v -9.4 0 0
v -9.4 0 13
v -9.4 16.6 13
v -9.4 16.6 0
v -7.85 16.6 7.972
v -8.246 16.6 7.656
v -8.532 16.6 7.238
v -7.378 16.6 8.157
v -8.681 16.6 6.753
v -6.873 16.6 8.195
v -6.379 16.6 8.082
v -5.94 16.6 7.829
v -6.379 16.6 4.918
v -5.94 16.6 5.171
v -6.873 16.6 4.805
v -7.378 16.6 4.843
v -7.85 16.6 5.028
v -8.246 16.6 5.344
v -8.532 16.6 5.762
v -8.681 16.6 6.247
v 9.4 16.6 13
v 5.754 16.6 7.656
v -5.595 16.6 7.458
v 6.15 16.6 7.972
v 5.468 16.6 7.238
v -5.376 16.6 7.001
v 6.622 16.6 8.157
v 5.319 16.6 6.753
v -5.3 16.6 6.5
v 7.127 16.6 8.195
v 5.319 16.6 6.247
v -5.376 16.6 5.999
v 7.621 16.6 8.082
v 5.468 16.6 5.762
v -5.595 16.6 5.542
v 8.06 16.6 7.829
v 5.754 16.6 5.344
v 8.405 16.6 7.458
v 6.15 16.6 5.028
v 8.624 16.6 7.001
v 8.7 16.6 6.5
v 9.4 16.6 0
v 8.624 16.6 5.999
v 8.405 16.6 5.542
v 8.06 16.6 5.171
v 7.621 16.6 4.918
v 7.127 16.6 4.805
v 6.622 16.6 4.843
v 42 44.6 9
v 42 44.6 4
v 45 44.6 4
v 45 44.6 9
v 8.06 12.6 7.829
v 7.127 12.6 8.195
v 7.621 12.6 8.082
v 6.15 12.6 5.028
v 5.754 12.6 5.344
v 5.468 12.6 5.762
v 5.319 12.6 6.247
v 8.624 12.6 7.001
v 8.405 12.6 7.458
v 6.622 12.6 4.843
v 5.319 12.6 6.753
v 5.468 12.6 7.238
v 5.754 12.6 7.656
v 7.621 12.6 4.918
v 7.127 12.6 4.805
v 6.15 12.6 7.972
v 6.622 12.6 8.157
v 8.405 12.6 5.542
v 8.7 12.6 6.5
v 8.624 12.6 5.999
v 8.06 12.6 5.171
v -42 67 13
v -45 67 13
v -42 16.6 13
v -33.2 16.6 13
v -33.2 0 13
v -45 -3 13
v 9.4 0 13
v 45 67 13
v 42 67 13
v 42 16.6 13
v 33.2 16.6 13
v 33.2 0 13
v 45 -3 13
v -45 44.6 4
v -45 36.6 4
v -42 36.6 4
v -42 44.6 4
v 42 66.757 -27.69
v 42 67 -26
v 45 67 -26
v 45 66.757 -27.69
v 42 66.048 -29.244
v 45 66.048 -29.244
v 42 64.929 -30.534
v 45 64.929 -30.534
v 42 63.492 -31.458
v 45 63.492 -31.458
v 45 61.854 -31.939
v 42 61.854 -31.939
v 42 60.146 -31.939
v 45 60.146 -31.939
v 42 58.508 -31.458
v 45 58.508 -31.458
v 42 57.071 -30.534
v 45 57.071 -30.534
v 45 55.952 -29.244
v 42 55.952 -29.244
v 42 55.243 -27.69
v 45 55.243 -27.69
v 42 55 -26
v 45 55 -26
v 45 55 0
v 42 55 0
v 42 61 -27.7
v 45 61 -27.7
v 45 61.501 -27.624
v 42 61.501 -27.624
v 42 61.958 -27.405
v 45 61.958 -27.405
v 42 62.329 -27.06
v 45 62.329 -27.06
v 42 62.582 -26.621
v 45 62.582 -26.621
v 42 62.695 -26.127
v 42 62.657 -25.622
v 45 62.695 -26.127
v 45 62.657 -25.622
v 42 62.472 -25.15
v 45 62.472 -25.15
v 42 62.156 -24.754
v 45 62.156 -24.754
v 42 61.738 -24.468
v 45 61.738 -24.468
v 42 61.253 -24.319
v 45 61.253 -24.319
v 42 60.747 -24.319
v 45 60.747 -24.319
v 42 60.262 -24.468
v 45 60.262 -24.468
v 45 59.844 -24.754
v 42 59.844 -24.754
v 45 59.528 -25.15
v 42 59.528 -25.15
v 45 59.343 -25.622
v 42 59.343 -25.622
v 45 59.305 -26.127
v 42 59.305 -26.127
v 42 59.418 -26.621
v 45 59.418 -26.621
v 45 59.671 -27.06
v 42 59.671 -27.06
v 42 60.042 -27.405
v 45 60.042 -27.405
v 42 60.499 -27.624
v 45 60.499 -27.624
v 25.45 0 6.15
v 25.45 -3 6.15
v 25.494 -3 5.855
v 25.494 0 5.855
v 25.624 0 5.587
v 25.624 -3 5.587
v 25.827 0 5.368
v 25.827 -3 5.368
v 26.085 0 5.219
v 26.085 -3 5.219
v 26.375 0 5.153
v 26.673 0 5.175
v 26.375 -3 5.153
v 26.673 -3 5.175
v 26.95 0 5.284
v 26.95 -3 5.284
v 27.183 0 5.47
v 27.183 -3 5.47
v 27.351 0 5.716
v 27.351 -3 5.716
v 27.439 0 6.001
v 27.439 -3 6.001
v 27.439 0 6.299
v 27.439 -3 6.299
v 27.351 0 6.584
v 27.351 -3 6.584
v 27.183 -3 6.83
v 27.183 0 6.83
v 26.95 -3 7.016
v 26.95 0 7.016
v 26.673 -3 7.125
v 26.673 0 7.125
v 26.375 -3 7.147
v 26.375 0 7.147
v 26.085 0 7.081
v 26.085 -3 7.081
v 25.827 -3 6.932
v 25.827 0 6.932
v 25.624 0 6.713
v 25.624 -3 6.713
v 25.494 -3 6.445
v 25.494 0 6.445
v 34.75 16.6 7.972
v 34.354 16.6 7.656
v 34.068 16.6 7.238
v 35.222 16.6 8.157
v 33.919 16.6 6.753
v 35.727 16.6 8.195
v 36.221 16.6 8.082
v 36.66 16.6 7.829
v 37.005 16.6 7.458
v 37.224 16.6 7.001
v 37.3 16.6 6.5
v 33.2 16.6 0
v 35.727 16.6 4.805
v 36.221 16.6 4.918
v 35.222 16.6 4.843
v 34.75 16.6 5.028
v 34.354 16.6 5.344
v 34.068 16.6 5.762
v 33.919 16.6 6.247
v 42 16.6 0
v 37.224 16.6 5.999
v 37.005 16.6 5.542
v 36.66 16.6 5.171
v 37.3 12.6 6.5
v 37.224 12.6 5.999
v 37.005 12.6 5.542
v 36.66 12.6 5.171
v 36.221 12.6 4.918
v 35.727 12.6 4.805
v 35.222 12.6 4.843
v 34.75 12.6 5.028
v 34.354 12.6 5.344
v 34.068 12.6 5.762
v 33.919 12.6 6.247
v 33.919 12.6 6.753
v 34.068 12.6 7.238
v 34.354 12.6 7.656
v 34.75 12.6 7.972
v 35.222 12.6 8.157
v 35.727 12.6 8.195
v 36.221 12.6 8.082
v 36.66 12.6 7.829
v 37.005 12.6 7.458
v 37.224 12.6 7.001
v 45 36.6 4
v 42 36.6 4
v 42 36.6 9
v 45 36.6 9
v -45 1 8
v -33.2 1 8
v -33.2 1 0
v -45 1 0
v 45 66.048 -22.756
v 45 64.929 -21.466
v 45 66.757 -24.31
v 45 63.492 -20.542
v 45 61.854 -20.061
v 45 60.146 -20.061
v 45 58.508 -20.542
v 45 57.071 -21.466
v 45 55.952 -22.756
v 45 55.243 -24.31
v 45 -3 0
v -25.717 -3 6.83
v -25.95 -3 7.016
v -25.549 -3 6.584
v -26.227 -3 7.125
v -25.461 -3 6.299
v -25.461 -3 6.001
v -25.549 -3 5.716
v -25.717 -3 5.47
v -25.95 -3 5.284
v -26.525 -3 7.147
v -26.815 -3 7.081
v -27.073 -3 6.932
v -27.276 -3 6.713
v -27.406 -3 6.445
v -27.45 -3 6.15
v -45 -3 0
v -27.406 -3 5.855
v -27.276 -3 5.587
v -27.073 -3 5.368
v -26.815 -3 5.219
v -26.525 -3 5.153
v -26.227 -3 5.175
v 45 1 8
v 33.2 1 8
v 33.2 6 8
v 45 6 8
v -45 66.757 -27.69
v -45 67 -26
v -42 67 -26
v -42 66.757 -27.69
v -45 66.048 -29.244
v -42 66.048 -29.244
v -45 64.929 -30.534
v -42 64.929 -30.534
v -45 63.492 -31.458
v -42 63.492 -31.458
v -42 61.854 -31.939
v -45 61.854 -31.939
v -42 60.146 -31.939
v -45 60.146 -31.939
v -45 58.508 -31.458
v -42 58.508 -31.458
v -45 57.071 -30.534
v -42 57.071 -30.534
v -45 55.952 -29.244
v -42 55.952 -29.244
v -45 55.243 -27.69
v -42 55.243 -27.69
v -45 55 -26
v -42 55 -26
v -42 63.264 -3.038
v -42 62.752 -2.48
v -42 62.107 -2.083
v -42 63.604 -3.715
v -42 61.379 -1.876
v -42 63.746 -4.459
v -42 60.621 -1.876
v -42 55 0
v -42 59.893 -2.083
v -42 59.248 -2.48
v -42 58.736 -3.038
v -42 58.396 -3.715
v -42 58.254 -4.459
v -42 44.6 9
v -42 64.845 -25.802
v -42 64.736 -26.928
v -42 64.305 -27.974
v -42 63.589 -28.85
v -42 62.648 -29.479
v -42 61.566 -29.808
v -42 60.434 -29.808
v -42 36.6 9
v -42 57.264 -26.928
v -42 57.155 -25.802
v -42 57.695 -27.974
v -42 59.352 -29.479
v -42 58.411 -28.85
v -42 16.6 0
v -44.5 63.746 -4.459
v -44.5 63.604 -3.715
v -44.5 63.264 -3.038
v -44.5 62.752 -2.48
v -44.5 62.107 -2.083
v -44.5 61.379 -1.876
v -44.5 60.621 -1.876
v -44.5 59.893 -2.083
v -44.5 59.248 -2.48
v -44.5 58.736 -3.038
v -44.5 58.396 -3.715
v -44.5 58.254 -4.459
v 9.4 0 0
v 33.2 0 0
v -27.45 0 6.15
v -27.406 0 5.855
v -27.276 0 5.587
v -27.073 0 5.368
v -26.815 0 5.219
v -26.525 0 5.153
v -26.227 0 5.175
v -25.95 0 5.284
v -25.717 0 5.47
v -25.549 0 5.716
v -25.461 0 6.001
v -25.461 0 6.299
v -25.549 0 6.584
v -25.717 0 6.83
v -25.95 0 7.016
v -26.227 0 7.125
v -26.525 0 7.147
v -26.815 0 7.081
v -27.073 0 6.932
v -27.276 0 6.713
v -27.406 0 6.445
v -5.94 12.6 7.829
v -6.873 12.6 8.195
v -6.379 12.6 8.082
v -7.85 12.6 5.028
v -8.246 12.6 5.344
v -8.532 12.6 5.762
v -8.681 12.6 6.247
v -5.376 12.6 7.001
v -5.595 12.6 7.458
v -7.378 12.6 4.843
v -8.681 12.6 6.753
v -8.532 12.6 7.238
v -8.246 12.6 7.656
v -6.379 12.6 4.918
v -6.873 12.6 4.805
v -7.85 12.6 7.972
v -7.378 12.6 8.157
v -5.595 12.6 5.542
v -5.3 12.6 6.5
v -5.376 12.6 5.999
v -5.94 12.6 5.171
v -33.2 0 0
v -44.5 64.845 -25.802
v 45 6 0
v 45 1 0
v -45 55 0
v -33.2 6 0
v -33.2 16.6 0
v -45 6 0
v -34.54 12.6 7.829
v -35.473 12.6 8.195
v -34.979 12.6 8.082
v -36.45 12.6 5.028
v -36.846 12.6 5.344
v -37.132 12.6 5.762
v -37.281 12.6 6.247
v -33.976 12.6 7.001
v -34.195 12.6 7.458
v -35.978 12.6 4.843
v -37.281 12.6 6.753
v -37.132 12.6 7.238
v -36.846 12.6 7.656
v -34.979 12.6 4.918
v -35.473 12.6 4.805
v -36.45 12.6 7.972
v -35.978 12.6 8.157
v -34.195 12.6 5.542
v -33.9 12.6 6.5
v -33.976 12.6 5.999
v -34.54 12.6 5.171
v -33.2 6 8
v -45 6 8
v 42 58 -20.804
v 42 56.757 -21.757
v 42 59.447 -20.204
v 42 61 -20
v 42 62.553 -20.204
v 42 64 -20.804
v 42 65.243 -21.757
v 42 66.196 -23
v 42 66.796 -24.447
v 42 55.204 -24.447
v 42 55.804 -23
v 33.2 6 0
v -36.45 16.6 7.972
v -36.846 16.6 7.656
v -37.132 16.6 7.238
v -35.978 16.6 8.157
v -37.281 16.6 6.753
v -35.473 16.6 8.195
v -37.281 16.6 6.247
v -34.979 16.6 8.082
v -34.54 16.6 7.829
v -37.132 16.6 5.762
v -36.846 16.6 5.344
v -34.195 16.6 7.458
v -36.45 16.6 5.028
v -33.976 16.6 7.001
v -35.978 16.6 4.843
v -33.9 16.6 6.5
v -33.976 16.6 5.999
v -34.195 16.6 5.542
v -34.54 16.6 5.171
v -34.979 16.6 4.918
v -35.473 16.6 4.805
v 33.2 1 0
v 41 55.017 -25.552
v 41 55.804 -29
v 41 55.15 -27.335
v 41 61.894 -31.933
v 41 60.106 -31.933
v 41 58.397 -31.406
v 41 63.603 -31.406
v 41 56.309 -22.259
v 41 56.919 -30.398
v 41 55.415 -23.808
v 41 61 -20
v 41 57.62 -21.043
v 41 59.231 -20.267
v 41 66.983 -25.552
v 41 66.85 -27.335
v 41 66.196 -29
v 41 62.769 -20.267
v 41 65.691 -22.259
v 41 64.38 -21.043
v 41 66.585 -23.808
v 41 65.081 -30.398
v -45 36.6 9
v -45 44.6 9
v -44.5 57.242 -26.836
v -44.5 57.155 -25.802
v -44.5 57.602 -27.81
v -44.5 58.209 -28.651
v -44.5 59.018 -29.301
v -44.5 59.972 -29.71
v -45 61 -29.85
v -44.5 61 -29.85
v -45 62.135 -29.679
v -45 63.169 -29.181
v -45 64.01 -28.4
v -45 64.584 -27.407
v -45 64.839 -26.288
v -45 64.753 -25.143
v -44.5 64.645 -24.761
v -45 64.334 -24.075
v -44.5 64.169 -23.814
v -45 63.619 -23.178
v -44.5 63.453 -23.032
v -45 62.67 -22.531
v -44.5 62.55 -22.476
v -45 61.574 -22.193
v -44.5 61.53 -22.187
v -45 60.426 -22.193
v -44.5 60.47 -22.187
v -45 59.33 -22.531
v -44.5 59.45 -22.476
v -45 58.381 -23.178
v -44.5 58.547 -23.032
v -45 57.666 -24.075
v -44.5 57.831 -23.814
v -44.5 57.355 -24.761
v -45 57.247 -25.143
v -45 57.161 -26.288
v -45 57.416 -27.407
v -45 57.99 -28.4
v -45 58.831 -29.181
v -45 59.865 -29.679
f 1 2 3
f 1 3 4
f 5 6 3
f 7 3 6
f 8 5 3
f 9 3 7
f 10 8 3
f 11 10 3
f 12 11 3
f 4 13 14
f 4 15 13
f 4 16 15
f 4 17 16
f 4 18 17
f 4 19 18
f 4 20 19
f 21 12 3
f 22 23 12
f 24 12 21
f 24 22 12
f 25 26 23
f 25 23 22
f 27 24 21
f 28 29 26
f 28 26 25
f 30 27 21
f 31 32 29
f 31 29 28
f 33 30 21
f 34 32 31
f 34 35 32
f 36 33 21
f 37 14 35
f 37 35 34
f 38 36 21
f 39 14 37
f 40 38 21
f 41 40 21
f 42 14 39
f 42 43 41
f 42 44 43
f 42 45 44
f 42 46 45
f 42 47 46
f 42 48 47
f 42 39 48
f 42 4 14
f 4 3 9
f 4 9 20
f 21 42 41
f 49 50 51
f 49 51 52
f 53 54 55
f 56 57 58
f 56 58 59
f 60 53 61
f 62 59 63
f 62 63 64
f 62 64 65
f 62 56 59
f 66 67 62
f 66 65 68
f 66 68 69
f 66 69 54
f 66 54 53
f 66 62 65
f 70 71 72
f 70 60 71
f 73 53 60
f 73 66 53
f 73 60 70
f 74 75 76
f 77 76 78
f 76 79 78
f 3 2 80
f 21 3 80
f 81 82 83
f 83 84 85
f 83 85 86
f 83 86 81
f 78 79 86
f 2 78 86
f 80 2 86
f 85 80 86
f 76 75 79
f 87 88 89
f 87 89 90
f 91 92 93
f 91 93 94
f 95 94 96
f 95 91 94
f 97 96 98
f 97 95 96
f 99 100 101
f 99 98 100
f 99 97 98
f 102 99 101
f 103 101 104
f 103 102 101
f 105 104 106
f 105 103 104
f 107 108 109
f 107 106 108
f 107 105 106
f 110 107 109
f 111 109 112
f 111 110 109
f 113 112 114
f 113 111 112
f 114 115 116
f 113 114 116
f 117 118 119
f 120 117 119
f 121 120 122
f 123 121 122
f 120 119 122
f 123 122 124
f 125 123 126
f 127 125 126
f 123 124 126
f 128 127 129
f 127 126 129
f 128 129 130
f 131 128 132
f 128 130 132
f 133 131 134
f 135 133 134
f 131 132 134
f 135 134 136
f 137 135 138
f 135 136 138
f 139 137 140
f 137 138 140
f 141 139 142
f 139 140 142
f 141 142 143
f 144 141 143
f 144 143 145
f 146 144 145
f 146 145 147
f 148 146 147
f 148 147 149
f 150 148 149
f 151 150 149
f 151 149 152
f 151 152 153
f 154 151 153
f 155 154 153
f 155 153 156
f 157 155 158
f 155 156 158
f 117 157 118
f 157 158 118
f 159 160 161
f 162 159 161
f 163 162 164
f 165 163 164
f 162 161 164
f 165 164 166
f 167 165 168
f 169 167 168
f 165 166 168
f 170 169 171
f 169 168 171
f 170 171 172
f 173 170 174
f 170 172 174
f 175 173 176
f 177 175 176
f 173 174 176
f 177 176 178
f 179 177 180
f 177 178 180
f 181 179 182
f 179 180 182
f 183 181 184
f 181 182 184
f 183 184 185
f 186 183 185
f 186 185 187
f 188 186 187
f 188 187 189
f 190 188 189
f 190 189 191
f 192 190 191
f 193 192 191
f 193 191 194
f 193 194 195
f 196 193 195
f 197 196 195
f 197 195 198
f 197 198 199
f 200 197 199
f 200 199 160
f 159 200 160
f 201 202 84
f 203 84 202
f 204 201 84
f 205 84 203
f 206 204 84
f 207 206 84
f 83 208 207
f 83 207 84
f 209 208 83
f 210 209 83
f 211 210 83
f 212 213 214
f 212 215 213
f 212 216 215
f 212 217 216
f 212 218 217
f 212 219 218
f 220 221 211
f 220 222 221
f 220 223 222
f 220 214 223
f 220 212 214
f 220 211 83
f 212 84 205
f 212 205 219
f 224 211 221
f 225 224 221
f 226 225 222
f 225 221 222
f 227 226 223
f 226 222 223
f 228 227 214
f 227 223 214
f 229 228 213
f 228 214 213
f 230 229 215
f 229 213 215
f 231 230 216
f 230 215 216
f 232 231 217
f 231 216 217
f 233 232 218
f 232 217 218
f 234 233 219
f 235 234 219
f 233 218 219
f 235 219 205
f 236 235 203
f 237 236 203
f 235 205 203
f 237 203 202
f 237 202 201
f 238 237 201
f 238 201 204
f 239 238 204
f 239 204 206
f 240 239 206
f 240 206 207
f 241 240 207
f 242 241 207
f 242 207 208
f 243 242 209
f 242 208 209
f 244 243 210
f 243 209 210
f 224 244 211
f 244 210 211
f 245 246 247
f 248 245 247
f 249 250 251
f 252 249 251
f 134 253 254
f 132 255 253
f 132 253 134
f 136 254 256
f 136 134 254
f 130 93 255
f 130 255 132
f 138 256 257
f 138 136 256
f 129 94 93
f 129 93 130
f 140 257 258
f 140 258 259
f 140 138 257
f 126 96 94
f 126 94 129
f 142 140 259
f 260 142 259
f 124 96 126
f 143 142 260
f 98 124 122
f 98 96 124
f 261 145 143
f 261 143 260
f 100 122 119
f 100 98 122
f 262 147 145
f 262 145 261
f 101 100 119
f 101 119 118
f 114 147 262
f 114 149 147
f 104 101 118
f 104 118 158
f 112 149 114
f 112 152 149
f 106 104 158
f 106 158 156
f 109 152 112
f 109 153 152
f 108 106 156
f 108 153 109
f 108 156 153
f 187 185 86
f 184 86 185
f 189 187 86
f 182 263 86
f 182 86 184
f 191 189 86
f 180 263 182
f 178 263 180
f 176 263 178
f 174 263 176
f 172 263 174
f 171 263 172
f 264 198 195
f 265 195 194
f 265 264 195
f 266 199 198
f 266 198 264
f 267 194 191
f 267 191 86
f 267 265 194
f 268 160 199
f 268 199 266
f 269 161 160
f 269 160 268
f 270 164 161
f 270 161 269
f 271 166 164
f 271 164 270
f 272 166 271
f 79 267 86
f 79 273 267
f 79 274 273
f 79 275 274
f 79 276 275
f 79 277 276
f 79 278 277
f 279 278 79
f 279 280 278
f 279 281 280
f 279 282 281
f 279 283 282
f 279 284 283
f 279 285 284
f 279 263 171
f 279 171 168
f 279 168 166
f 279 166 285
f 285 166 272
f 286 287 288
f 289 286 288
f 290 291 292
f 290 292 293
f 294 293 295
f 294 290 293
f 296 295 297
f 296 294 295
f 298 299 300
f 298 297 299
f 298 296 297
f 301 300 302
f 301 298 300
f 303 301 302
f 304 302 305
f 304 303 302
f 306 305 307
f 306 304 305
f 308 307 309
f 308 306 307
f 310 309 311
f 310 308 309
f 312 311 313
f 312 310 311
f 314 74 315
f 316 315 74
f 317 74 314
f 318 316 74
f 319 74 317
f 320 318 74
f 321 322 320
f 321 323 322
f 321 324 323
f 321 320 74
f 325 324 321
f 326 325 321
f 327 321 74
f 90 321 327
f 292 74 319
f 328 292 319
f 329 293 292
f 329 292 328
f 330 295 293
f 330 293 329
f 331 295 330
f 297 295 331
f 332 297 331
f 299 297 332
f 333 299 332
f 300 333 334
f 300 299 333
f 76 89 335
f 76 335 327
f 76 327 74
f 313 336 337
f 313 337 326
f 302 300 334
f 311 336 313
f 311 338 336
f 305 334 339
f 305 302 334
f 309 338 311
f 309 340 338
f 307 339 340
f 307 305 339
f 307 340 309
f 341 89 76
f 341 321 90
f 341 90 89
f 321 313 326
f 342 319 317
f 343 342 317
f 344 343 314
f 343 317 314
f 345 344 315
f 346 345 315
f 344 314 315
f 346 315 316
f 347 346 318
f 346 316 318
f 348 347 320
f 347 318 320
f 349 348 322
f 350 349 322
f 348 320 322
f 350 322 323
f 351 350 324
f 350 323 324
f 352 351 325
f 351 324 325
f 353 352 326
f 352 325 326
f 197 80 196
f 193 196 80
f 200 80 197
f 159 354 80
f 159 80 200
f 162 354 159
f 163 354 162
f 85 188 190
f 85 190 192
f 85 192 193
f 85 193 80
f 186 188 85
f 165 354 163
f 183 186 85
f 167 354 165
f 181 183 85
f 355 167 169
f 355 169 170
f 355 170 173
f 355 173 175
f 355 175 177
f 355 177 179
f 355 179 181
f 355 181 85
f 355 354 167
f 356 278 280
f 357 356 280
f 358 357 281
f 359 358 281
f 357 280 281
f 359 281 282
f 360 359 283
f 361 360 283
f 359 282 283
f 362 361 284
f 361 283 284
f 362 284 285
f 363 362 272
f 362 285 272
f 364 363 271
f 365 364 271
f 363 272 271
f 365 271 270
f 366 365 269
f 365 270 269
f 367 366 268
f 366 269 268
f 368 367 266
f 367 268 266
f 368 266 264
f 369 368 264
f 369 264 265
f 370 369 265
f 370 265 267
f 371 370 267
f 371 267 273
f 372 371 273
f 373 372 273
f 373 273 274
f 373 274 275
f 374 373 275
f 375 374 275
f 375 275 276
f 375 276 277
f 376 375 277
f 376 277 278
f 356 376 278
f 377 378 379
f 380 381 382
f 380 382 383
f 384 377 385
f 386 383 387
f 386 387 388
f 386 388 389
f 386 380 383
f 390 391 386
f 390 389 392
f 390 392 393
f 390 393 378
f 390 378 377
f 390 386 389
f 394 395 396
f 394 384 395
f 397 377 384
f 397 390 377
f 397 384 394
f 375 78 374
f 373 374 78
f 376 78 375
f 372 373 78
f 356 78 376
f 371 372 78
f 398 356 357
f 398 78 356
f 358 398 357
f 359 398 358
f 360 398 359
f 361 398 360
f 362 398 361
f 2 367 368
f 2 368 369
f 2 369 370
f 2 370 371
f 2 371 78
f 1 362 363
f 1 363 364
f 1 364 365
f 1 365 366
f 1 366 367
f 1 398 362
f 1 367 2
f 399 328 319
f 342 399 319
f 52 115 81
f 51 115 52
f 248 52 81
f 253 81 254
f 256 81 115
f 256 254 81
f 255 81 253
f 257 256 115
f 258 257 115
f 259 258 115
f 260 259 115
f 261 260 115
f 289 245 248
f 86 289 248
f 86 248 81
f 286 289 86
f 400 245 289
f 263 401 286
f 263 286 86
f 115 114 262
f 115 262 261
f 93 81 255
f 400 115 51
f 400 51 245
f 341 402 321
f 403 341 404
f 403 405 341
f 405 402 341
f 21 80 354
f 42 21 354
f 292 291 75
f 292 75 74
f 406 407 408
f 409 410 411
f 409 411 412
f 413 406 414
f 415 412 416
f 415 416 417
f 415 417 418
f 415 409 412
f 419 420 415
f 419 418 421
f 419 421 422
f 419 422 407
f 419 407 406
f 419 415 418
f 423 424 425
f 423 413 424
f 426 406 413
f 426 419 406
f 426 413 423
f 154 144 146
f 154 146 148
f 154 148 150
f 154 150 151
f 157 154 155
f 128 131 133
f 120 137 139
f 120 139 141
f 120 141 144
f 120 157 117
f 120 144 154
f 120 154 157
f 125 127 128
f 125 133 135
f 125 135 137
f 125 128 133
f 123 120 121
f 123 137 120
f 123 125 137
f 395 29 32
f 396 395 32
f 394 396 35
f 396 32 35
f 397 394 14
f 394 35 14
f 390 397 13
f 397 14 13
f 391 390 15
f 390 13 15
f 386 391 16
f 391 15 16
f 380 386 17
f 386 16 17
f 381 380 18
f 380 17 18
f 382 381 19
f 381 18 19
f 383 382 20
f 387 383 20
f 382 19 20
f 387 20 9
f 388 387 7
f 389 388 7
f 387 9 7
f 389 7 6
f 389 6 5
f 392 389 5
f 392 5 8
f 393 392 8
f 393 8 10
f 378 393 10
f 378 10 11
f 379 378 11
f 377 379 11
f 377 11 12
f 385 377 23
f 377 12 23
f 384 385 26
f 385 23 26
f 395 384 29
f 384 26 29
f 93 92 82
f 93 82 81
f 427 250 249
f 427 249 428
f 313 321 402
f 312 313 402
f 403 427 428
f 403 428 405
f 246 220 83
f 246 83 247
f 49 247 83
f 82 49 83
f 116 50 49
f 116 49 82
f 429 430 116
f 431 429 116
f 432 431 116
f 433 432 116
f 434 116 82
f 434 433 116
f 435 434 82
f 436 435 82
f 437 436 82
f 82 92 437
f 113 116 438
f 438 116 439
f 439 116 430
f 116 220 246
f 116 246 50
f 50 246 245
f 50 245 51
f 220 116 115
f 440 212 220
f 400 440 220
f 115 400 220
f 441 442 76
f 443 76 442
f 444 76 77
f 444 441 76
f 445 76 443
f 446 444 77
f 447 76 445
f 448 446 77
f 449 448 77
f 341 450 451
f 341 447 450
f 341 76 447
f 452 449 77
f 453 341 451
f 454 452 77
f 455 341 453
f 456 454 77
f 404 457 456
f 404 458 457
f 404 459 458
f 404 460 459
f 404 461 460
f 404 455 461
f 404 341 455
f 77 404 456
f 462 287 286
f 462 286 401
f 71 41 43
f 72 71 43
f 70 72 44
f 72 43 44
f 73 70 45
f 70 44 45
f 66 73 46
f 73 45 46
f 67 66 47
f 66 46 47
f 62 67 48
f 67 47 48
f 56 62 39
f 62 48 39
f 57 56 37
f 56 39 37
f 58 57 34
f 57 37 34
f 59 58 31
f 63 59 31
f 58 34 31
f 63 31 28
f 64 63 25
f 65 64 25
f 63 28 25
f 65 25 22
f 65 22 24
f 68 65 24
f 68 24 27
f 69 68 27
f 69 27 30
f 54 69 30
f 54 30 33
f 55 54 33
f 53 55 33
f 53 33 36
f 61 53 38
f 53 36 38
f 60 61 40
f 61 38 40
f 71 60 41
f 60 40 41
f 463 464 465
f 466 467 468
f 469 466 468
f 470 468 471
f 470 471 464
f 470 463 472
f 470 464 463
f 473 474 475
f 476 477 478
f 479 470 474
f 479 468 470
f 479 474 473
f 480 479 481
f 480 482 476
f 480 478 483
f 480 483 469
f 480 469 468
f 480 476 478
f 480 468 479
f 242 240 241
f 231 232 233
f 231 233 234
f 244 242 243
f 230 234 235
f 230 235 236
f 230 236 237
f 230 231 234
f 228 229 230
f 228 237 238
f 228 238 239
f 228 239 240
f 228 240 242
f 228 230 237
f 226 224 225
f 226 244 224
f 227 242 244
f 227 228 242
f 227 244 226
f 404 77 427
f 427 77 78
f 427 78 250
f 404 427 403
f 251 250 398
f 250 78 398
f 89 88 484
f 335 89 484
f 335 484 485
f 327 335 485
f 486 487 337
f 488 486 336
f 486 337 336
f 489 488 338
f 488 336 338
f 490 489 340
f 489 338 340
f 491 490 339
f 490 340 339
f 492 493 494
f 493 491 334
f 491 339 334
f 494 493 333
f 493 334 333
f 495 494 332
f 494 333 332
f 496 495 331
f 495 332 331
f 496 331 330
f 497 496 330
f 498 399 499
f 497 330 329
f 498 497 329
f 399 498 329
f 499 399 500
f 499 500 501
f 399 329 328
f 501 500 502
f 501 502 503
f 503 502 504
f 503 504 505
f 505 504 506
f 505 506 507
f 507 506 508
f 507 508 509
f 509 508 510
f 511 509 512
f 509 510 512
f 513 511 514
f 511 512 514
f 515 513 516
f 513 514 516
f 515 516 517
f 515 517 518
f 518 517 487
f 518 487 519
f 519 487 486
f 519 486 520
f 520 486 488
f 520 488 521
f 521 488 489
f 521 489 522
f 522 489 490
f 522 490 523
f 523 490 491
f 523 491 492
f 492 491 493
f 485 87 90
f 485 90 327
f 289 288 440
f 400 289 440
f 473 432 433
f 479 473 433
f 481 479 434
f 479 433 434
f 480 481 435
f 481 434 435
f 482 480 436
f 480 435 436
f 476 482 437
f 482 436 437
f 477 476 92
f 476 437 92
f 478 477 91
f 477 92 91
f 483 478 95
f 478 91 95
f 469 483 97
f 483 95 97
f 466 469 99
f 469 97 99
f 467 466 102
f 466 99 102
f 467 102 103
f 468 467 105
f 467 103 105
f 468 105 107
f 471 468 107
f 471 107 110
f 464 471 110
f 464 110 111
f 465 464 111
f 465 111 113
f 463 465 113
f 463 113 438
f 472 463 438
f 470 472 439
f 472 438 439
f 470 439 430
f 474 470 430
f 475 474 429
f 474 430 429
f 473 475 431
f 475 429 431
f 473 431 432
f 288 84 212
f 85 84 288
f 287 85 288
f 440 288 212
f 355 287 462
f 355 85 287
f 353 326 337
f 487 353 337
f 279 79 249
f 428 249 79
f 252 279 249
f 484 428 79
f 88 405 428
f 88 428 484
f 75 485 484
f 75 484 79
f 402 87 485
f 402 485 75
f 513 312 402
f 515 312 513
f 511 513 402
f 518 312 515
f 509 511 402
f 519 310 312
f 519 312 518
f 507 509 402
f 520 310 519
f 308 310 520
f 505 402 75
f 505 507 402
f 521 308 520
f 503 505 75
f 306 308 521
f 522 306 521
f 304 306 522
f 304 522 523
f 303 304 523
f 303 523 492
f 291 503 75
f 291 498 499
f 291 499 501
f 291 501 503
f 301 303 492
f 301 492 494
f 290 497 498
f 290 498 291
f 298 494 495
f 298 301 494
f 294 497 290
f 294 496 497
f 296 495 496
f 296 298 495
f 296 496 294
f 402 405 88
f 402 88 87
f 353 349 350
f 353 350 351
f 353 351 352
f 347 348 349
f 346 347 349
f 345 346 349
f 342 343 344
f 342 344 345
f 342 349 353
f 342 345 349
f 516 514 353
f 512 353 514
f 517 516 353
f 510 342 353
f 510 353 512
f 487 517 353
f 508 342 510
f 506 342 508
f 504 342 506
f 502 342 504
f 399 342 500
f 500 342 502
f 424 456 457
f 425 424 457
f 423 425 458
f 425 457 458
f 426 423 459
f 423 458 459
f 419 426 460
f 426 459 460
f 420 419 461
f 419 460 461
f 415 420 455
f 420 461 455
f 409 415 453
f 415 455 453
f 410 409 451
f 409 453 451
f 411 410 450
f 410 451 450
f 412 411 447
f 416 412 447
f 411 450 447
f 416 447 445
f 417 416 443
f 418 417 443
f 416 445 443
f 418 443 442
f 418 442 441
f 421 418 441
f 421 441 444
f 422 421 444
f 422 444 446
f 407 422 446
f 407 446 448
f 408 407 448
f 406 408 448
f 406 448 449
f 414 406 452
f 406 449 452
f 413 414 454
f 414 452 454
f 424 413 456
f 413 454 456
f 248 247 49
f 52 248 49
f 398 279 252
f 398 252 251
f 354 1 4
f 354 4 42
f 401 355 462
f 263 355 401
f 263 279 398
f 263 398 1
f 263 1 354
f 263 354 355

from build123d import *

# Parameters (mm, degrees)
AUFSATZ_LINEAR_AUSTRAGEN1_DEPTH  = 13
AUFSATZ_LINEAR_START             = -13
SKIZZE2_W                        = 3
SKIZZE2_H                        = 12
AUFSATZ_LINEAR_AUSTRAGEN2_DEPTH  = 45
SKIZZE3_W                        = 8.8
SKIZZE3_H                        = 13
SKIZZE3_W_2                      = 18.8
AUFSATZ_LINEAR_AUSTRAGEN3_DEPTH  = 16.6
SKIZZE4_R                        = 1.7
SCHNITT_LINEAR_AUSTRAGEN1_DEPTH  = 4
SKIZZE6_R                        = 1.5
SCHNITT_LINEAR_AUSTRAGEN2_DEPTH  = 4
SCHNITT_LINEAR_START             = -3
SCHNITT_LINEAR_AUSTRAGEN4_DEPTH  = 2.5
SCHNITT_LINEAR_AUSTRAGEN6_DEPTH  = 91
SCHNITT_LINEAR_AUSTRAGEN7_REACH  = 2.5
SKIZZE11_R                       = 3.85
SCHNITT_LINEAR_START_2           = -15
SKIZZE12_W                       = 8
SKIZZE12_H                       = 5
SCHNITT_LINEAR_AUSTRAGEN8_DEPTH  = 16
SKIZZE13_W                       = 5
SKIZZE13_H                       = 8
SCHNITT_LINEAR_AUSTRAGEN9_DEPTH  = 91
SKIZZE14_R                       = 1
SCHNITT_LINEAR_AUSTRAGEN10_DEPTH = 71
AUFSATZ_LINEAR_START_2           = -3
SKIZZE15_R                       = 6
AUFSATZ_LINEAR_AUSTRAGEN4_DEPTH  = 4
SKIZZE16_R                       = 1.7
SCHNITT_LINEAR_AUSTRAGEN11_DEPTH = 3


with BuildPart() as part:
    # Skizze1 → Aufsatz-Linear austragen1 (new body)
    with BuildSketch(Plane.XY):
        Polygon((-45, 67), (-42, 67), (-42, 0), (42, 0), (42, 67), (45, 67), (45, -3), (-45, -3), align=None)
    extrude(amount=AUFSATZ_LINEAR_AUSTRAGEN1_DEPTH)

    # Skizze2 → Aufsatz-Linear austragen2 (add)
    with BuildSketch(Plane(origin=(0, 0, 0), x_dir=(-1, 0, 0), z_dir=(0, 0, -1)).offset(AUFSATZ_LINEAR_START)):
        with Locations((-43.5, 61)):
            Rectangle(SKIZZE2_W, SKIZZE2_H)
        with Locations((43.5, 61)):
            Rectangle(SKIZZE2_W, SKIZZE2_H)
    extrude(amount=AUFSATZ_LINEAR_AUSTRAGEN2_DEPTH)

    # Skizze3 → Aufsatz-Linear austragen3 (add)
    with BuildSketch(Plane(origin=(0, 0, 0), x_dir=(1, 0, 0), z_dir=(0, 1, 0))):
        with Locations((-37.6, -6.5)):
            Rectangle(SKIZZE3_W, SKIZZE3_H)
        with Locations((37.6, -6.5)):
            Rectangle(SKIZZE3_W, SKIZZE3_H)
        with Locations((0, -6.5)):
            Rectangle(SKIZZE3_W_2, SKIZZE3_H)
    extrude(amount=AUFSATZ_LINEAR_AUSTRAGEN3_DEPTH)

    # Skizze4 → Schnitt-Linear austragen1 (cut)
    with BuildSketch(Plane(origin=(0, 16.6, 0), x_dir=(1, 0, 0), z_dir=(0, 1, 0))):
        with Locations((-35.6, -6.5)):
            Circle(SKIZZE4_R)
        with Locations((-7, -6.5)):
            Circle(SKIZZE4_R)
        with Locations((7, -6.5)):
            Circle(SKIZZE4_R)
        with Locations((35.6, -6.5)):
            Circle(SKIZZE4_R)
    extrude(amount=-SCHNITT_LINEAR_AUSTRAGEN1_DEPTH, mode=Mode.SUBTRACT)

    # Skizze6 → Schnitt-Linear austragen2 (cut, through all)
    with BuildSketch(Plane.ZY.offset(-42)):
        with Locations((-26, 61)):
            Circle(SKIZZE6_R)
    extrude(amount=-SCHNITT_LINEAR_AUSTRAGEN2_DEPTH, mode=Mode.SUBTRACT)

    # Skizze7 → Schnitt-Linear austragen4 (cut)
    with BuildSketch(Plane.ZY.offset(45).offset(SCHNITT_LINEAR_START)):
        with BuildLine():
            Line((-25.802102804, 64.844910493), (-4.45864486, 63.746364638))
            ThreePointArc((-4.45864486, 63.746364638), (-1.85, 61), (-4.45864486, 58.253635362))
            Line((-4.45864486, 58.253635362), (-25.802102804, 57.155089507))
            ThreePointArc((-25.802102804, 57.155089507), (-29.85, 61), (-25.802102804, 64.844910493))
        make_face()
    extrude(amount=SCHNITT_LINEAR_AUSTRAGEN4_DEPTH, mode=Mode.SUBTRACT)

    # Skizze10 → Schnitt-Linear austragen6 (cut, through all)
    with BuildSketch(Plane.ZY.offset(45)):
        with BuildLine():
            Line((-26, 55), (-40.113250667, 55))
            Line((-40.113250667, 55), (-40.113250667, 67))
            Line((-40.113250667, 67), (-26, 67))
            ThreePointArc((-26, 67), (-32, 61), (-26, 55))
        make_face()
    extrude(amount=-SCHNITT_LINEAR_AUSTRAGEN6_DEPTH, mode=Mode.SUBTRACT)

    # Skizze11 → Schnitt-Linear austragen7 (cut, up to next)
    with BuildSketch(Plane(origin=(-44.5, 0, 0), x_dir=(0, 0, -1), z_dir=(1, 0, 0)), mode=Mode.PRIVATE) as schnitt_linear_austragen7_sk1:
        with Locations((26, 61)):
            Circle(SKIZZE11_R)
    schnitt_linear_austragen7_tool1 = extrude(schnitt_linear_austragen7_sk1.sketch, amount=-SCHNITT_LINEAR_AUSTRAGEN7_REACH, mode=Mode.PRIVATE) & part.part
    add(schnitt_linear_austragen7_tool1.solids().sort_by_distance((-44.5, 61, -26))[0], mode=Mode.SUBTRACT)

    # Skizze12 → Schnitt-Linear austragen8 (cut)
    with BuildSketch(Plane(origin=(45, 0, 0), x_dir=(0, 0, -1), z_dir=(1, 0, 0)).offset(SCHNITT_LINEAR_START_2)):
        with Locations((-4, 3.5)):
            Rectangle(SKIZZE12_W, SKIZZE12_H)
    schnitt_linear_austragen8 = extrude(amount=SCHNITT_LINEAR_AUSTRAGEN8_DEPTH, mode=Mode.SUBTRACT)

    # Spiegeln1: Schnitt-Linear austragen8 across plane
    add(schnitt_linear_austragen8.mirror(Plane.ZY), mode=Mode.SUBTRACT)

    # Skizze13 → Schnitt-Linear austragen9 (cut, through all)
    with BuildSketch(Plane.ZY.offset(45)):
        with Locations((6.5, 40.6)):
            Rectangle(SKIZZE13_W, SKIZZE13_H)
    extrude(amount=-SCHNITT_LINEAR_AUSTRAGEN9_DEPTH, mode=Mode.SUBTRACT)

    # Skizze14 → Schnitt-Linear austragen10 (cut, through all)
    with BuildSketch(Plane(origin=(0, -3, 0), x_dir=(-1, 0, 0), z_dir=(0, -1, 0))):
        with Locations((26.45, -6.15)):
            Circle(SKIZZE14_R)
        with Locations((-26.45, -6.15)):
            Circle(SKIZZE14_R)
    extrude(amount=-SCHNITT_LINEAR_AUSTRAGEN10_DEPTH, mode=Mode.SUBTRACT)

    # Skizze15 → Aufsatz-Linear austragen4 (add)
    with BuildSketch(Plane.ZY.offset(-42).offset(AUFSATZ_LINEAR_START_2)):
        with Locations((-26, 61)):
            Circle(SKIZZE15_R)
    extrude(amount=AUFSATZ_LINEAR_AUSTRAGEN4_DEPTH)

    # Skizze16 → Schnitt-Linear austragen11 (cut)
    with BuildSketch(Plane(origin=(45, 0, 0), x_dir=(0, 0, -1), z_dir=(1, 0, 0))):
        with Locations((26, 61)):
            Circle(SKIZZE16_R)
    extrude(amount=-SCHNITT_LINEAR_AUSTRAGEN11_DEPTH, mode=Mode.SUBTRACT)


solid = part.part
